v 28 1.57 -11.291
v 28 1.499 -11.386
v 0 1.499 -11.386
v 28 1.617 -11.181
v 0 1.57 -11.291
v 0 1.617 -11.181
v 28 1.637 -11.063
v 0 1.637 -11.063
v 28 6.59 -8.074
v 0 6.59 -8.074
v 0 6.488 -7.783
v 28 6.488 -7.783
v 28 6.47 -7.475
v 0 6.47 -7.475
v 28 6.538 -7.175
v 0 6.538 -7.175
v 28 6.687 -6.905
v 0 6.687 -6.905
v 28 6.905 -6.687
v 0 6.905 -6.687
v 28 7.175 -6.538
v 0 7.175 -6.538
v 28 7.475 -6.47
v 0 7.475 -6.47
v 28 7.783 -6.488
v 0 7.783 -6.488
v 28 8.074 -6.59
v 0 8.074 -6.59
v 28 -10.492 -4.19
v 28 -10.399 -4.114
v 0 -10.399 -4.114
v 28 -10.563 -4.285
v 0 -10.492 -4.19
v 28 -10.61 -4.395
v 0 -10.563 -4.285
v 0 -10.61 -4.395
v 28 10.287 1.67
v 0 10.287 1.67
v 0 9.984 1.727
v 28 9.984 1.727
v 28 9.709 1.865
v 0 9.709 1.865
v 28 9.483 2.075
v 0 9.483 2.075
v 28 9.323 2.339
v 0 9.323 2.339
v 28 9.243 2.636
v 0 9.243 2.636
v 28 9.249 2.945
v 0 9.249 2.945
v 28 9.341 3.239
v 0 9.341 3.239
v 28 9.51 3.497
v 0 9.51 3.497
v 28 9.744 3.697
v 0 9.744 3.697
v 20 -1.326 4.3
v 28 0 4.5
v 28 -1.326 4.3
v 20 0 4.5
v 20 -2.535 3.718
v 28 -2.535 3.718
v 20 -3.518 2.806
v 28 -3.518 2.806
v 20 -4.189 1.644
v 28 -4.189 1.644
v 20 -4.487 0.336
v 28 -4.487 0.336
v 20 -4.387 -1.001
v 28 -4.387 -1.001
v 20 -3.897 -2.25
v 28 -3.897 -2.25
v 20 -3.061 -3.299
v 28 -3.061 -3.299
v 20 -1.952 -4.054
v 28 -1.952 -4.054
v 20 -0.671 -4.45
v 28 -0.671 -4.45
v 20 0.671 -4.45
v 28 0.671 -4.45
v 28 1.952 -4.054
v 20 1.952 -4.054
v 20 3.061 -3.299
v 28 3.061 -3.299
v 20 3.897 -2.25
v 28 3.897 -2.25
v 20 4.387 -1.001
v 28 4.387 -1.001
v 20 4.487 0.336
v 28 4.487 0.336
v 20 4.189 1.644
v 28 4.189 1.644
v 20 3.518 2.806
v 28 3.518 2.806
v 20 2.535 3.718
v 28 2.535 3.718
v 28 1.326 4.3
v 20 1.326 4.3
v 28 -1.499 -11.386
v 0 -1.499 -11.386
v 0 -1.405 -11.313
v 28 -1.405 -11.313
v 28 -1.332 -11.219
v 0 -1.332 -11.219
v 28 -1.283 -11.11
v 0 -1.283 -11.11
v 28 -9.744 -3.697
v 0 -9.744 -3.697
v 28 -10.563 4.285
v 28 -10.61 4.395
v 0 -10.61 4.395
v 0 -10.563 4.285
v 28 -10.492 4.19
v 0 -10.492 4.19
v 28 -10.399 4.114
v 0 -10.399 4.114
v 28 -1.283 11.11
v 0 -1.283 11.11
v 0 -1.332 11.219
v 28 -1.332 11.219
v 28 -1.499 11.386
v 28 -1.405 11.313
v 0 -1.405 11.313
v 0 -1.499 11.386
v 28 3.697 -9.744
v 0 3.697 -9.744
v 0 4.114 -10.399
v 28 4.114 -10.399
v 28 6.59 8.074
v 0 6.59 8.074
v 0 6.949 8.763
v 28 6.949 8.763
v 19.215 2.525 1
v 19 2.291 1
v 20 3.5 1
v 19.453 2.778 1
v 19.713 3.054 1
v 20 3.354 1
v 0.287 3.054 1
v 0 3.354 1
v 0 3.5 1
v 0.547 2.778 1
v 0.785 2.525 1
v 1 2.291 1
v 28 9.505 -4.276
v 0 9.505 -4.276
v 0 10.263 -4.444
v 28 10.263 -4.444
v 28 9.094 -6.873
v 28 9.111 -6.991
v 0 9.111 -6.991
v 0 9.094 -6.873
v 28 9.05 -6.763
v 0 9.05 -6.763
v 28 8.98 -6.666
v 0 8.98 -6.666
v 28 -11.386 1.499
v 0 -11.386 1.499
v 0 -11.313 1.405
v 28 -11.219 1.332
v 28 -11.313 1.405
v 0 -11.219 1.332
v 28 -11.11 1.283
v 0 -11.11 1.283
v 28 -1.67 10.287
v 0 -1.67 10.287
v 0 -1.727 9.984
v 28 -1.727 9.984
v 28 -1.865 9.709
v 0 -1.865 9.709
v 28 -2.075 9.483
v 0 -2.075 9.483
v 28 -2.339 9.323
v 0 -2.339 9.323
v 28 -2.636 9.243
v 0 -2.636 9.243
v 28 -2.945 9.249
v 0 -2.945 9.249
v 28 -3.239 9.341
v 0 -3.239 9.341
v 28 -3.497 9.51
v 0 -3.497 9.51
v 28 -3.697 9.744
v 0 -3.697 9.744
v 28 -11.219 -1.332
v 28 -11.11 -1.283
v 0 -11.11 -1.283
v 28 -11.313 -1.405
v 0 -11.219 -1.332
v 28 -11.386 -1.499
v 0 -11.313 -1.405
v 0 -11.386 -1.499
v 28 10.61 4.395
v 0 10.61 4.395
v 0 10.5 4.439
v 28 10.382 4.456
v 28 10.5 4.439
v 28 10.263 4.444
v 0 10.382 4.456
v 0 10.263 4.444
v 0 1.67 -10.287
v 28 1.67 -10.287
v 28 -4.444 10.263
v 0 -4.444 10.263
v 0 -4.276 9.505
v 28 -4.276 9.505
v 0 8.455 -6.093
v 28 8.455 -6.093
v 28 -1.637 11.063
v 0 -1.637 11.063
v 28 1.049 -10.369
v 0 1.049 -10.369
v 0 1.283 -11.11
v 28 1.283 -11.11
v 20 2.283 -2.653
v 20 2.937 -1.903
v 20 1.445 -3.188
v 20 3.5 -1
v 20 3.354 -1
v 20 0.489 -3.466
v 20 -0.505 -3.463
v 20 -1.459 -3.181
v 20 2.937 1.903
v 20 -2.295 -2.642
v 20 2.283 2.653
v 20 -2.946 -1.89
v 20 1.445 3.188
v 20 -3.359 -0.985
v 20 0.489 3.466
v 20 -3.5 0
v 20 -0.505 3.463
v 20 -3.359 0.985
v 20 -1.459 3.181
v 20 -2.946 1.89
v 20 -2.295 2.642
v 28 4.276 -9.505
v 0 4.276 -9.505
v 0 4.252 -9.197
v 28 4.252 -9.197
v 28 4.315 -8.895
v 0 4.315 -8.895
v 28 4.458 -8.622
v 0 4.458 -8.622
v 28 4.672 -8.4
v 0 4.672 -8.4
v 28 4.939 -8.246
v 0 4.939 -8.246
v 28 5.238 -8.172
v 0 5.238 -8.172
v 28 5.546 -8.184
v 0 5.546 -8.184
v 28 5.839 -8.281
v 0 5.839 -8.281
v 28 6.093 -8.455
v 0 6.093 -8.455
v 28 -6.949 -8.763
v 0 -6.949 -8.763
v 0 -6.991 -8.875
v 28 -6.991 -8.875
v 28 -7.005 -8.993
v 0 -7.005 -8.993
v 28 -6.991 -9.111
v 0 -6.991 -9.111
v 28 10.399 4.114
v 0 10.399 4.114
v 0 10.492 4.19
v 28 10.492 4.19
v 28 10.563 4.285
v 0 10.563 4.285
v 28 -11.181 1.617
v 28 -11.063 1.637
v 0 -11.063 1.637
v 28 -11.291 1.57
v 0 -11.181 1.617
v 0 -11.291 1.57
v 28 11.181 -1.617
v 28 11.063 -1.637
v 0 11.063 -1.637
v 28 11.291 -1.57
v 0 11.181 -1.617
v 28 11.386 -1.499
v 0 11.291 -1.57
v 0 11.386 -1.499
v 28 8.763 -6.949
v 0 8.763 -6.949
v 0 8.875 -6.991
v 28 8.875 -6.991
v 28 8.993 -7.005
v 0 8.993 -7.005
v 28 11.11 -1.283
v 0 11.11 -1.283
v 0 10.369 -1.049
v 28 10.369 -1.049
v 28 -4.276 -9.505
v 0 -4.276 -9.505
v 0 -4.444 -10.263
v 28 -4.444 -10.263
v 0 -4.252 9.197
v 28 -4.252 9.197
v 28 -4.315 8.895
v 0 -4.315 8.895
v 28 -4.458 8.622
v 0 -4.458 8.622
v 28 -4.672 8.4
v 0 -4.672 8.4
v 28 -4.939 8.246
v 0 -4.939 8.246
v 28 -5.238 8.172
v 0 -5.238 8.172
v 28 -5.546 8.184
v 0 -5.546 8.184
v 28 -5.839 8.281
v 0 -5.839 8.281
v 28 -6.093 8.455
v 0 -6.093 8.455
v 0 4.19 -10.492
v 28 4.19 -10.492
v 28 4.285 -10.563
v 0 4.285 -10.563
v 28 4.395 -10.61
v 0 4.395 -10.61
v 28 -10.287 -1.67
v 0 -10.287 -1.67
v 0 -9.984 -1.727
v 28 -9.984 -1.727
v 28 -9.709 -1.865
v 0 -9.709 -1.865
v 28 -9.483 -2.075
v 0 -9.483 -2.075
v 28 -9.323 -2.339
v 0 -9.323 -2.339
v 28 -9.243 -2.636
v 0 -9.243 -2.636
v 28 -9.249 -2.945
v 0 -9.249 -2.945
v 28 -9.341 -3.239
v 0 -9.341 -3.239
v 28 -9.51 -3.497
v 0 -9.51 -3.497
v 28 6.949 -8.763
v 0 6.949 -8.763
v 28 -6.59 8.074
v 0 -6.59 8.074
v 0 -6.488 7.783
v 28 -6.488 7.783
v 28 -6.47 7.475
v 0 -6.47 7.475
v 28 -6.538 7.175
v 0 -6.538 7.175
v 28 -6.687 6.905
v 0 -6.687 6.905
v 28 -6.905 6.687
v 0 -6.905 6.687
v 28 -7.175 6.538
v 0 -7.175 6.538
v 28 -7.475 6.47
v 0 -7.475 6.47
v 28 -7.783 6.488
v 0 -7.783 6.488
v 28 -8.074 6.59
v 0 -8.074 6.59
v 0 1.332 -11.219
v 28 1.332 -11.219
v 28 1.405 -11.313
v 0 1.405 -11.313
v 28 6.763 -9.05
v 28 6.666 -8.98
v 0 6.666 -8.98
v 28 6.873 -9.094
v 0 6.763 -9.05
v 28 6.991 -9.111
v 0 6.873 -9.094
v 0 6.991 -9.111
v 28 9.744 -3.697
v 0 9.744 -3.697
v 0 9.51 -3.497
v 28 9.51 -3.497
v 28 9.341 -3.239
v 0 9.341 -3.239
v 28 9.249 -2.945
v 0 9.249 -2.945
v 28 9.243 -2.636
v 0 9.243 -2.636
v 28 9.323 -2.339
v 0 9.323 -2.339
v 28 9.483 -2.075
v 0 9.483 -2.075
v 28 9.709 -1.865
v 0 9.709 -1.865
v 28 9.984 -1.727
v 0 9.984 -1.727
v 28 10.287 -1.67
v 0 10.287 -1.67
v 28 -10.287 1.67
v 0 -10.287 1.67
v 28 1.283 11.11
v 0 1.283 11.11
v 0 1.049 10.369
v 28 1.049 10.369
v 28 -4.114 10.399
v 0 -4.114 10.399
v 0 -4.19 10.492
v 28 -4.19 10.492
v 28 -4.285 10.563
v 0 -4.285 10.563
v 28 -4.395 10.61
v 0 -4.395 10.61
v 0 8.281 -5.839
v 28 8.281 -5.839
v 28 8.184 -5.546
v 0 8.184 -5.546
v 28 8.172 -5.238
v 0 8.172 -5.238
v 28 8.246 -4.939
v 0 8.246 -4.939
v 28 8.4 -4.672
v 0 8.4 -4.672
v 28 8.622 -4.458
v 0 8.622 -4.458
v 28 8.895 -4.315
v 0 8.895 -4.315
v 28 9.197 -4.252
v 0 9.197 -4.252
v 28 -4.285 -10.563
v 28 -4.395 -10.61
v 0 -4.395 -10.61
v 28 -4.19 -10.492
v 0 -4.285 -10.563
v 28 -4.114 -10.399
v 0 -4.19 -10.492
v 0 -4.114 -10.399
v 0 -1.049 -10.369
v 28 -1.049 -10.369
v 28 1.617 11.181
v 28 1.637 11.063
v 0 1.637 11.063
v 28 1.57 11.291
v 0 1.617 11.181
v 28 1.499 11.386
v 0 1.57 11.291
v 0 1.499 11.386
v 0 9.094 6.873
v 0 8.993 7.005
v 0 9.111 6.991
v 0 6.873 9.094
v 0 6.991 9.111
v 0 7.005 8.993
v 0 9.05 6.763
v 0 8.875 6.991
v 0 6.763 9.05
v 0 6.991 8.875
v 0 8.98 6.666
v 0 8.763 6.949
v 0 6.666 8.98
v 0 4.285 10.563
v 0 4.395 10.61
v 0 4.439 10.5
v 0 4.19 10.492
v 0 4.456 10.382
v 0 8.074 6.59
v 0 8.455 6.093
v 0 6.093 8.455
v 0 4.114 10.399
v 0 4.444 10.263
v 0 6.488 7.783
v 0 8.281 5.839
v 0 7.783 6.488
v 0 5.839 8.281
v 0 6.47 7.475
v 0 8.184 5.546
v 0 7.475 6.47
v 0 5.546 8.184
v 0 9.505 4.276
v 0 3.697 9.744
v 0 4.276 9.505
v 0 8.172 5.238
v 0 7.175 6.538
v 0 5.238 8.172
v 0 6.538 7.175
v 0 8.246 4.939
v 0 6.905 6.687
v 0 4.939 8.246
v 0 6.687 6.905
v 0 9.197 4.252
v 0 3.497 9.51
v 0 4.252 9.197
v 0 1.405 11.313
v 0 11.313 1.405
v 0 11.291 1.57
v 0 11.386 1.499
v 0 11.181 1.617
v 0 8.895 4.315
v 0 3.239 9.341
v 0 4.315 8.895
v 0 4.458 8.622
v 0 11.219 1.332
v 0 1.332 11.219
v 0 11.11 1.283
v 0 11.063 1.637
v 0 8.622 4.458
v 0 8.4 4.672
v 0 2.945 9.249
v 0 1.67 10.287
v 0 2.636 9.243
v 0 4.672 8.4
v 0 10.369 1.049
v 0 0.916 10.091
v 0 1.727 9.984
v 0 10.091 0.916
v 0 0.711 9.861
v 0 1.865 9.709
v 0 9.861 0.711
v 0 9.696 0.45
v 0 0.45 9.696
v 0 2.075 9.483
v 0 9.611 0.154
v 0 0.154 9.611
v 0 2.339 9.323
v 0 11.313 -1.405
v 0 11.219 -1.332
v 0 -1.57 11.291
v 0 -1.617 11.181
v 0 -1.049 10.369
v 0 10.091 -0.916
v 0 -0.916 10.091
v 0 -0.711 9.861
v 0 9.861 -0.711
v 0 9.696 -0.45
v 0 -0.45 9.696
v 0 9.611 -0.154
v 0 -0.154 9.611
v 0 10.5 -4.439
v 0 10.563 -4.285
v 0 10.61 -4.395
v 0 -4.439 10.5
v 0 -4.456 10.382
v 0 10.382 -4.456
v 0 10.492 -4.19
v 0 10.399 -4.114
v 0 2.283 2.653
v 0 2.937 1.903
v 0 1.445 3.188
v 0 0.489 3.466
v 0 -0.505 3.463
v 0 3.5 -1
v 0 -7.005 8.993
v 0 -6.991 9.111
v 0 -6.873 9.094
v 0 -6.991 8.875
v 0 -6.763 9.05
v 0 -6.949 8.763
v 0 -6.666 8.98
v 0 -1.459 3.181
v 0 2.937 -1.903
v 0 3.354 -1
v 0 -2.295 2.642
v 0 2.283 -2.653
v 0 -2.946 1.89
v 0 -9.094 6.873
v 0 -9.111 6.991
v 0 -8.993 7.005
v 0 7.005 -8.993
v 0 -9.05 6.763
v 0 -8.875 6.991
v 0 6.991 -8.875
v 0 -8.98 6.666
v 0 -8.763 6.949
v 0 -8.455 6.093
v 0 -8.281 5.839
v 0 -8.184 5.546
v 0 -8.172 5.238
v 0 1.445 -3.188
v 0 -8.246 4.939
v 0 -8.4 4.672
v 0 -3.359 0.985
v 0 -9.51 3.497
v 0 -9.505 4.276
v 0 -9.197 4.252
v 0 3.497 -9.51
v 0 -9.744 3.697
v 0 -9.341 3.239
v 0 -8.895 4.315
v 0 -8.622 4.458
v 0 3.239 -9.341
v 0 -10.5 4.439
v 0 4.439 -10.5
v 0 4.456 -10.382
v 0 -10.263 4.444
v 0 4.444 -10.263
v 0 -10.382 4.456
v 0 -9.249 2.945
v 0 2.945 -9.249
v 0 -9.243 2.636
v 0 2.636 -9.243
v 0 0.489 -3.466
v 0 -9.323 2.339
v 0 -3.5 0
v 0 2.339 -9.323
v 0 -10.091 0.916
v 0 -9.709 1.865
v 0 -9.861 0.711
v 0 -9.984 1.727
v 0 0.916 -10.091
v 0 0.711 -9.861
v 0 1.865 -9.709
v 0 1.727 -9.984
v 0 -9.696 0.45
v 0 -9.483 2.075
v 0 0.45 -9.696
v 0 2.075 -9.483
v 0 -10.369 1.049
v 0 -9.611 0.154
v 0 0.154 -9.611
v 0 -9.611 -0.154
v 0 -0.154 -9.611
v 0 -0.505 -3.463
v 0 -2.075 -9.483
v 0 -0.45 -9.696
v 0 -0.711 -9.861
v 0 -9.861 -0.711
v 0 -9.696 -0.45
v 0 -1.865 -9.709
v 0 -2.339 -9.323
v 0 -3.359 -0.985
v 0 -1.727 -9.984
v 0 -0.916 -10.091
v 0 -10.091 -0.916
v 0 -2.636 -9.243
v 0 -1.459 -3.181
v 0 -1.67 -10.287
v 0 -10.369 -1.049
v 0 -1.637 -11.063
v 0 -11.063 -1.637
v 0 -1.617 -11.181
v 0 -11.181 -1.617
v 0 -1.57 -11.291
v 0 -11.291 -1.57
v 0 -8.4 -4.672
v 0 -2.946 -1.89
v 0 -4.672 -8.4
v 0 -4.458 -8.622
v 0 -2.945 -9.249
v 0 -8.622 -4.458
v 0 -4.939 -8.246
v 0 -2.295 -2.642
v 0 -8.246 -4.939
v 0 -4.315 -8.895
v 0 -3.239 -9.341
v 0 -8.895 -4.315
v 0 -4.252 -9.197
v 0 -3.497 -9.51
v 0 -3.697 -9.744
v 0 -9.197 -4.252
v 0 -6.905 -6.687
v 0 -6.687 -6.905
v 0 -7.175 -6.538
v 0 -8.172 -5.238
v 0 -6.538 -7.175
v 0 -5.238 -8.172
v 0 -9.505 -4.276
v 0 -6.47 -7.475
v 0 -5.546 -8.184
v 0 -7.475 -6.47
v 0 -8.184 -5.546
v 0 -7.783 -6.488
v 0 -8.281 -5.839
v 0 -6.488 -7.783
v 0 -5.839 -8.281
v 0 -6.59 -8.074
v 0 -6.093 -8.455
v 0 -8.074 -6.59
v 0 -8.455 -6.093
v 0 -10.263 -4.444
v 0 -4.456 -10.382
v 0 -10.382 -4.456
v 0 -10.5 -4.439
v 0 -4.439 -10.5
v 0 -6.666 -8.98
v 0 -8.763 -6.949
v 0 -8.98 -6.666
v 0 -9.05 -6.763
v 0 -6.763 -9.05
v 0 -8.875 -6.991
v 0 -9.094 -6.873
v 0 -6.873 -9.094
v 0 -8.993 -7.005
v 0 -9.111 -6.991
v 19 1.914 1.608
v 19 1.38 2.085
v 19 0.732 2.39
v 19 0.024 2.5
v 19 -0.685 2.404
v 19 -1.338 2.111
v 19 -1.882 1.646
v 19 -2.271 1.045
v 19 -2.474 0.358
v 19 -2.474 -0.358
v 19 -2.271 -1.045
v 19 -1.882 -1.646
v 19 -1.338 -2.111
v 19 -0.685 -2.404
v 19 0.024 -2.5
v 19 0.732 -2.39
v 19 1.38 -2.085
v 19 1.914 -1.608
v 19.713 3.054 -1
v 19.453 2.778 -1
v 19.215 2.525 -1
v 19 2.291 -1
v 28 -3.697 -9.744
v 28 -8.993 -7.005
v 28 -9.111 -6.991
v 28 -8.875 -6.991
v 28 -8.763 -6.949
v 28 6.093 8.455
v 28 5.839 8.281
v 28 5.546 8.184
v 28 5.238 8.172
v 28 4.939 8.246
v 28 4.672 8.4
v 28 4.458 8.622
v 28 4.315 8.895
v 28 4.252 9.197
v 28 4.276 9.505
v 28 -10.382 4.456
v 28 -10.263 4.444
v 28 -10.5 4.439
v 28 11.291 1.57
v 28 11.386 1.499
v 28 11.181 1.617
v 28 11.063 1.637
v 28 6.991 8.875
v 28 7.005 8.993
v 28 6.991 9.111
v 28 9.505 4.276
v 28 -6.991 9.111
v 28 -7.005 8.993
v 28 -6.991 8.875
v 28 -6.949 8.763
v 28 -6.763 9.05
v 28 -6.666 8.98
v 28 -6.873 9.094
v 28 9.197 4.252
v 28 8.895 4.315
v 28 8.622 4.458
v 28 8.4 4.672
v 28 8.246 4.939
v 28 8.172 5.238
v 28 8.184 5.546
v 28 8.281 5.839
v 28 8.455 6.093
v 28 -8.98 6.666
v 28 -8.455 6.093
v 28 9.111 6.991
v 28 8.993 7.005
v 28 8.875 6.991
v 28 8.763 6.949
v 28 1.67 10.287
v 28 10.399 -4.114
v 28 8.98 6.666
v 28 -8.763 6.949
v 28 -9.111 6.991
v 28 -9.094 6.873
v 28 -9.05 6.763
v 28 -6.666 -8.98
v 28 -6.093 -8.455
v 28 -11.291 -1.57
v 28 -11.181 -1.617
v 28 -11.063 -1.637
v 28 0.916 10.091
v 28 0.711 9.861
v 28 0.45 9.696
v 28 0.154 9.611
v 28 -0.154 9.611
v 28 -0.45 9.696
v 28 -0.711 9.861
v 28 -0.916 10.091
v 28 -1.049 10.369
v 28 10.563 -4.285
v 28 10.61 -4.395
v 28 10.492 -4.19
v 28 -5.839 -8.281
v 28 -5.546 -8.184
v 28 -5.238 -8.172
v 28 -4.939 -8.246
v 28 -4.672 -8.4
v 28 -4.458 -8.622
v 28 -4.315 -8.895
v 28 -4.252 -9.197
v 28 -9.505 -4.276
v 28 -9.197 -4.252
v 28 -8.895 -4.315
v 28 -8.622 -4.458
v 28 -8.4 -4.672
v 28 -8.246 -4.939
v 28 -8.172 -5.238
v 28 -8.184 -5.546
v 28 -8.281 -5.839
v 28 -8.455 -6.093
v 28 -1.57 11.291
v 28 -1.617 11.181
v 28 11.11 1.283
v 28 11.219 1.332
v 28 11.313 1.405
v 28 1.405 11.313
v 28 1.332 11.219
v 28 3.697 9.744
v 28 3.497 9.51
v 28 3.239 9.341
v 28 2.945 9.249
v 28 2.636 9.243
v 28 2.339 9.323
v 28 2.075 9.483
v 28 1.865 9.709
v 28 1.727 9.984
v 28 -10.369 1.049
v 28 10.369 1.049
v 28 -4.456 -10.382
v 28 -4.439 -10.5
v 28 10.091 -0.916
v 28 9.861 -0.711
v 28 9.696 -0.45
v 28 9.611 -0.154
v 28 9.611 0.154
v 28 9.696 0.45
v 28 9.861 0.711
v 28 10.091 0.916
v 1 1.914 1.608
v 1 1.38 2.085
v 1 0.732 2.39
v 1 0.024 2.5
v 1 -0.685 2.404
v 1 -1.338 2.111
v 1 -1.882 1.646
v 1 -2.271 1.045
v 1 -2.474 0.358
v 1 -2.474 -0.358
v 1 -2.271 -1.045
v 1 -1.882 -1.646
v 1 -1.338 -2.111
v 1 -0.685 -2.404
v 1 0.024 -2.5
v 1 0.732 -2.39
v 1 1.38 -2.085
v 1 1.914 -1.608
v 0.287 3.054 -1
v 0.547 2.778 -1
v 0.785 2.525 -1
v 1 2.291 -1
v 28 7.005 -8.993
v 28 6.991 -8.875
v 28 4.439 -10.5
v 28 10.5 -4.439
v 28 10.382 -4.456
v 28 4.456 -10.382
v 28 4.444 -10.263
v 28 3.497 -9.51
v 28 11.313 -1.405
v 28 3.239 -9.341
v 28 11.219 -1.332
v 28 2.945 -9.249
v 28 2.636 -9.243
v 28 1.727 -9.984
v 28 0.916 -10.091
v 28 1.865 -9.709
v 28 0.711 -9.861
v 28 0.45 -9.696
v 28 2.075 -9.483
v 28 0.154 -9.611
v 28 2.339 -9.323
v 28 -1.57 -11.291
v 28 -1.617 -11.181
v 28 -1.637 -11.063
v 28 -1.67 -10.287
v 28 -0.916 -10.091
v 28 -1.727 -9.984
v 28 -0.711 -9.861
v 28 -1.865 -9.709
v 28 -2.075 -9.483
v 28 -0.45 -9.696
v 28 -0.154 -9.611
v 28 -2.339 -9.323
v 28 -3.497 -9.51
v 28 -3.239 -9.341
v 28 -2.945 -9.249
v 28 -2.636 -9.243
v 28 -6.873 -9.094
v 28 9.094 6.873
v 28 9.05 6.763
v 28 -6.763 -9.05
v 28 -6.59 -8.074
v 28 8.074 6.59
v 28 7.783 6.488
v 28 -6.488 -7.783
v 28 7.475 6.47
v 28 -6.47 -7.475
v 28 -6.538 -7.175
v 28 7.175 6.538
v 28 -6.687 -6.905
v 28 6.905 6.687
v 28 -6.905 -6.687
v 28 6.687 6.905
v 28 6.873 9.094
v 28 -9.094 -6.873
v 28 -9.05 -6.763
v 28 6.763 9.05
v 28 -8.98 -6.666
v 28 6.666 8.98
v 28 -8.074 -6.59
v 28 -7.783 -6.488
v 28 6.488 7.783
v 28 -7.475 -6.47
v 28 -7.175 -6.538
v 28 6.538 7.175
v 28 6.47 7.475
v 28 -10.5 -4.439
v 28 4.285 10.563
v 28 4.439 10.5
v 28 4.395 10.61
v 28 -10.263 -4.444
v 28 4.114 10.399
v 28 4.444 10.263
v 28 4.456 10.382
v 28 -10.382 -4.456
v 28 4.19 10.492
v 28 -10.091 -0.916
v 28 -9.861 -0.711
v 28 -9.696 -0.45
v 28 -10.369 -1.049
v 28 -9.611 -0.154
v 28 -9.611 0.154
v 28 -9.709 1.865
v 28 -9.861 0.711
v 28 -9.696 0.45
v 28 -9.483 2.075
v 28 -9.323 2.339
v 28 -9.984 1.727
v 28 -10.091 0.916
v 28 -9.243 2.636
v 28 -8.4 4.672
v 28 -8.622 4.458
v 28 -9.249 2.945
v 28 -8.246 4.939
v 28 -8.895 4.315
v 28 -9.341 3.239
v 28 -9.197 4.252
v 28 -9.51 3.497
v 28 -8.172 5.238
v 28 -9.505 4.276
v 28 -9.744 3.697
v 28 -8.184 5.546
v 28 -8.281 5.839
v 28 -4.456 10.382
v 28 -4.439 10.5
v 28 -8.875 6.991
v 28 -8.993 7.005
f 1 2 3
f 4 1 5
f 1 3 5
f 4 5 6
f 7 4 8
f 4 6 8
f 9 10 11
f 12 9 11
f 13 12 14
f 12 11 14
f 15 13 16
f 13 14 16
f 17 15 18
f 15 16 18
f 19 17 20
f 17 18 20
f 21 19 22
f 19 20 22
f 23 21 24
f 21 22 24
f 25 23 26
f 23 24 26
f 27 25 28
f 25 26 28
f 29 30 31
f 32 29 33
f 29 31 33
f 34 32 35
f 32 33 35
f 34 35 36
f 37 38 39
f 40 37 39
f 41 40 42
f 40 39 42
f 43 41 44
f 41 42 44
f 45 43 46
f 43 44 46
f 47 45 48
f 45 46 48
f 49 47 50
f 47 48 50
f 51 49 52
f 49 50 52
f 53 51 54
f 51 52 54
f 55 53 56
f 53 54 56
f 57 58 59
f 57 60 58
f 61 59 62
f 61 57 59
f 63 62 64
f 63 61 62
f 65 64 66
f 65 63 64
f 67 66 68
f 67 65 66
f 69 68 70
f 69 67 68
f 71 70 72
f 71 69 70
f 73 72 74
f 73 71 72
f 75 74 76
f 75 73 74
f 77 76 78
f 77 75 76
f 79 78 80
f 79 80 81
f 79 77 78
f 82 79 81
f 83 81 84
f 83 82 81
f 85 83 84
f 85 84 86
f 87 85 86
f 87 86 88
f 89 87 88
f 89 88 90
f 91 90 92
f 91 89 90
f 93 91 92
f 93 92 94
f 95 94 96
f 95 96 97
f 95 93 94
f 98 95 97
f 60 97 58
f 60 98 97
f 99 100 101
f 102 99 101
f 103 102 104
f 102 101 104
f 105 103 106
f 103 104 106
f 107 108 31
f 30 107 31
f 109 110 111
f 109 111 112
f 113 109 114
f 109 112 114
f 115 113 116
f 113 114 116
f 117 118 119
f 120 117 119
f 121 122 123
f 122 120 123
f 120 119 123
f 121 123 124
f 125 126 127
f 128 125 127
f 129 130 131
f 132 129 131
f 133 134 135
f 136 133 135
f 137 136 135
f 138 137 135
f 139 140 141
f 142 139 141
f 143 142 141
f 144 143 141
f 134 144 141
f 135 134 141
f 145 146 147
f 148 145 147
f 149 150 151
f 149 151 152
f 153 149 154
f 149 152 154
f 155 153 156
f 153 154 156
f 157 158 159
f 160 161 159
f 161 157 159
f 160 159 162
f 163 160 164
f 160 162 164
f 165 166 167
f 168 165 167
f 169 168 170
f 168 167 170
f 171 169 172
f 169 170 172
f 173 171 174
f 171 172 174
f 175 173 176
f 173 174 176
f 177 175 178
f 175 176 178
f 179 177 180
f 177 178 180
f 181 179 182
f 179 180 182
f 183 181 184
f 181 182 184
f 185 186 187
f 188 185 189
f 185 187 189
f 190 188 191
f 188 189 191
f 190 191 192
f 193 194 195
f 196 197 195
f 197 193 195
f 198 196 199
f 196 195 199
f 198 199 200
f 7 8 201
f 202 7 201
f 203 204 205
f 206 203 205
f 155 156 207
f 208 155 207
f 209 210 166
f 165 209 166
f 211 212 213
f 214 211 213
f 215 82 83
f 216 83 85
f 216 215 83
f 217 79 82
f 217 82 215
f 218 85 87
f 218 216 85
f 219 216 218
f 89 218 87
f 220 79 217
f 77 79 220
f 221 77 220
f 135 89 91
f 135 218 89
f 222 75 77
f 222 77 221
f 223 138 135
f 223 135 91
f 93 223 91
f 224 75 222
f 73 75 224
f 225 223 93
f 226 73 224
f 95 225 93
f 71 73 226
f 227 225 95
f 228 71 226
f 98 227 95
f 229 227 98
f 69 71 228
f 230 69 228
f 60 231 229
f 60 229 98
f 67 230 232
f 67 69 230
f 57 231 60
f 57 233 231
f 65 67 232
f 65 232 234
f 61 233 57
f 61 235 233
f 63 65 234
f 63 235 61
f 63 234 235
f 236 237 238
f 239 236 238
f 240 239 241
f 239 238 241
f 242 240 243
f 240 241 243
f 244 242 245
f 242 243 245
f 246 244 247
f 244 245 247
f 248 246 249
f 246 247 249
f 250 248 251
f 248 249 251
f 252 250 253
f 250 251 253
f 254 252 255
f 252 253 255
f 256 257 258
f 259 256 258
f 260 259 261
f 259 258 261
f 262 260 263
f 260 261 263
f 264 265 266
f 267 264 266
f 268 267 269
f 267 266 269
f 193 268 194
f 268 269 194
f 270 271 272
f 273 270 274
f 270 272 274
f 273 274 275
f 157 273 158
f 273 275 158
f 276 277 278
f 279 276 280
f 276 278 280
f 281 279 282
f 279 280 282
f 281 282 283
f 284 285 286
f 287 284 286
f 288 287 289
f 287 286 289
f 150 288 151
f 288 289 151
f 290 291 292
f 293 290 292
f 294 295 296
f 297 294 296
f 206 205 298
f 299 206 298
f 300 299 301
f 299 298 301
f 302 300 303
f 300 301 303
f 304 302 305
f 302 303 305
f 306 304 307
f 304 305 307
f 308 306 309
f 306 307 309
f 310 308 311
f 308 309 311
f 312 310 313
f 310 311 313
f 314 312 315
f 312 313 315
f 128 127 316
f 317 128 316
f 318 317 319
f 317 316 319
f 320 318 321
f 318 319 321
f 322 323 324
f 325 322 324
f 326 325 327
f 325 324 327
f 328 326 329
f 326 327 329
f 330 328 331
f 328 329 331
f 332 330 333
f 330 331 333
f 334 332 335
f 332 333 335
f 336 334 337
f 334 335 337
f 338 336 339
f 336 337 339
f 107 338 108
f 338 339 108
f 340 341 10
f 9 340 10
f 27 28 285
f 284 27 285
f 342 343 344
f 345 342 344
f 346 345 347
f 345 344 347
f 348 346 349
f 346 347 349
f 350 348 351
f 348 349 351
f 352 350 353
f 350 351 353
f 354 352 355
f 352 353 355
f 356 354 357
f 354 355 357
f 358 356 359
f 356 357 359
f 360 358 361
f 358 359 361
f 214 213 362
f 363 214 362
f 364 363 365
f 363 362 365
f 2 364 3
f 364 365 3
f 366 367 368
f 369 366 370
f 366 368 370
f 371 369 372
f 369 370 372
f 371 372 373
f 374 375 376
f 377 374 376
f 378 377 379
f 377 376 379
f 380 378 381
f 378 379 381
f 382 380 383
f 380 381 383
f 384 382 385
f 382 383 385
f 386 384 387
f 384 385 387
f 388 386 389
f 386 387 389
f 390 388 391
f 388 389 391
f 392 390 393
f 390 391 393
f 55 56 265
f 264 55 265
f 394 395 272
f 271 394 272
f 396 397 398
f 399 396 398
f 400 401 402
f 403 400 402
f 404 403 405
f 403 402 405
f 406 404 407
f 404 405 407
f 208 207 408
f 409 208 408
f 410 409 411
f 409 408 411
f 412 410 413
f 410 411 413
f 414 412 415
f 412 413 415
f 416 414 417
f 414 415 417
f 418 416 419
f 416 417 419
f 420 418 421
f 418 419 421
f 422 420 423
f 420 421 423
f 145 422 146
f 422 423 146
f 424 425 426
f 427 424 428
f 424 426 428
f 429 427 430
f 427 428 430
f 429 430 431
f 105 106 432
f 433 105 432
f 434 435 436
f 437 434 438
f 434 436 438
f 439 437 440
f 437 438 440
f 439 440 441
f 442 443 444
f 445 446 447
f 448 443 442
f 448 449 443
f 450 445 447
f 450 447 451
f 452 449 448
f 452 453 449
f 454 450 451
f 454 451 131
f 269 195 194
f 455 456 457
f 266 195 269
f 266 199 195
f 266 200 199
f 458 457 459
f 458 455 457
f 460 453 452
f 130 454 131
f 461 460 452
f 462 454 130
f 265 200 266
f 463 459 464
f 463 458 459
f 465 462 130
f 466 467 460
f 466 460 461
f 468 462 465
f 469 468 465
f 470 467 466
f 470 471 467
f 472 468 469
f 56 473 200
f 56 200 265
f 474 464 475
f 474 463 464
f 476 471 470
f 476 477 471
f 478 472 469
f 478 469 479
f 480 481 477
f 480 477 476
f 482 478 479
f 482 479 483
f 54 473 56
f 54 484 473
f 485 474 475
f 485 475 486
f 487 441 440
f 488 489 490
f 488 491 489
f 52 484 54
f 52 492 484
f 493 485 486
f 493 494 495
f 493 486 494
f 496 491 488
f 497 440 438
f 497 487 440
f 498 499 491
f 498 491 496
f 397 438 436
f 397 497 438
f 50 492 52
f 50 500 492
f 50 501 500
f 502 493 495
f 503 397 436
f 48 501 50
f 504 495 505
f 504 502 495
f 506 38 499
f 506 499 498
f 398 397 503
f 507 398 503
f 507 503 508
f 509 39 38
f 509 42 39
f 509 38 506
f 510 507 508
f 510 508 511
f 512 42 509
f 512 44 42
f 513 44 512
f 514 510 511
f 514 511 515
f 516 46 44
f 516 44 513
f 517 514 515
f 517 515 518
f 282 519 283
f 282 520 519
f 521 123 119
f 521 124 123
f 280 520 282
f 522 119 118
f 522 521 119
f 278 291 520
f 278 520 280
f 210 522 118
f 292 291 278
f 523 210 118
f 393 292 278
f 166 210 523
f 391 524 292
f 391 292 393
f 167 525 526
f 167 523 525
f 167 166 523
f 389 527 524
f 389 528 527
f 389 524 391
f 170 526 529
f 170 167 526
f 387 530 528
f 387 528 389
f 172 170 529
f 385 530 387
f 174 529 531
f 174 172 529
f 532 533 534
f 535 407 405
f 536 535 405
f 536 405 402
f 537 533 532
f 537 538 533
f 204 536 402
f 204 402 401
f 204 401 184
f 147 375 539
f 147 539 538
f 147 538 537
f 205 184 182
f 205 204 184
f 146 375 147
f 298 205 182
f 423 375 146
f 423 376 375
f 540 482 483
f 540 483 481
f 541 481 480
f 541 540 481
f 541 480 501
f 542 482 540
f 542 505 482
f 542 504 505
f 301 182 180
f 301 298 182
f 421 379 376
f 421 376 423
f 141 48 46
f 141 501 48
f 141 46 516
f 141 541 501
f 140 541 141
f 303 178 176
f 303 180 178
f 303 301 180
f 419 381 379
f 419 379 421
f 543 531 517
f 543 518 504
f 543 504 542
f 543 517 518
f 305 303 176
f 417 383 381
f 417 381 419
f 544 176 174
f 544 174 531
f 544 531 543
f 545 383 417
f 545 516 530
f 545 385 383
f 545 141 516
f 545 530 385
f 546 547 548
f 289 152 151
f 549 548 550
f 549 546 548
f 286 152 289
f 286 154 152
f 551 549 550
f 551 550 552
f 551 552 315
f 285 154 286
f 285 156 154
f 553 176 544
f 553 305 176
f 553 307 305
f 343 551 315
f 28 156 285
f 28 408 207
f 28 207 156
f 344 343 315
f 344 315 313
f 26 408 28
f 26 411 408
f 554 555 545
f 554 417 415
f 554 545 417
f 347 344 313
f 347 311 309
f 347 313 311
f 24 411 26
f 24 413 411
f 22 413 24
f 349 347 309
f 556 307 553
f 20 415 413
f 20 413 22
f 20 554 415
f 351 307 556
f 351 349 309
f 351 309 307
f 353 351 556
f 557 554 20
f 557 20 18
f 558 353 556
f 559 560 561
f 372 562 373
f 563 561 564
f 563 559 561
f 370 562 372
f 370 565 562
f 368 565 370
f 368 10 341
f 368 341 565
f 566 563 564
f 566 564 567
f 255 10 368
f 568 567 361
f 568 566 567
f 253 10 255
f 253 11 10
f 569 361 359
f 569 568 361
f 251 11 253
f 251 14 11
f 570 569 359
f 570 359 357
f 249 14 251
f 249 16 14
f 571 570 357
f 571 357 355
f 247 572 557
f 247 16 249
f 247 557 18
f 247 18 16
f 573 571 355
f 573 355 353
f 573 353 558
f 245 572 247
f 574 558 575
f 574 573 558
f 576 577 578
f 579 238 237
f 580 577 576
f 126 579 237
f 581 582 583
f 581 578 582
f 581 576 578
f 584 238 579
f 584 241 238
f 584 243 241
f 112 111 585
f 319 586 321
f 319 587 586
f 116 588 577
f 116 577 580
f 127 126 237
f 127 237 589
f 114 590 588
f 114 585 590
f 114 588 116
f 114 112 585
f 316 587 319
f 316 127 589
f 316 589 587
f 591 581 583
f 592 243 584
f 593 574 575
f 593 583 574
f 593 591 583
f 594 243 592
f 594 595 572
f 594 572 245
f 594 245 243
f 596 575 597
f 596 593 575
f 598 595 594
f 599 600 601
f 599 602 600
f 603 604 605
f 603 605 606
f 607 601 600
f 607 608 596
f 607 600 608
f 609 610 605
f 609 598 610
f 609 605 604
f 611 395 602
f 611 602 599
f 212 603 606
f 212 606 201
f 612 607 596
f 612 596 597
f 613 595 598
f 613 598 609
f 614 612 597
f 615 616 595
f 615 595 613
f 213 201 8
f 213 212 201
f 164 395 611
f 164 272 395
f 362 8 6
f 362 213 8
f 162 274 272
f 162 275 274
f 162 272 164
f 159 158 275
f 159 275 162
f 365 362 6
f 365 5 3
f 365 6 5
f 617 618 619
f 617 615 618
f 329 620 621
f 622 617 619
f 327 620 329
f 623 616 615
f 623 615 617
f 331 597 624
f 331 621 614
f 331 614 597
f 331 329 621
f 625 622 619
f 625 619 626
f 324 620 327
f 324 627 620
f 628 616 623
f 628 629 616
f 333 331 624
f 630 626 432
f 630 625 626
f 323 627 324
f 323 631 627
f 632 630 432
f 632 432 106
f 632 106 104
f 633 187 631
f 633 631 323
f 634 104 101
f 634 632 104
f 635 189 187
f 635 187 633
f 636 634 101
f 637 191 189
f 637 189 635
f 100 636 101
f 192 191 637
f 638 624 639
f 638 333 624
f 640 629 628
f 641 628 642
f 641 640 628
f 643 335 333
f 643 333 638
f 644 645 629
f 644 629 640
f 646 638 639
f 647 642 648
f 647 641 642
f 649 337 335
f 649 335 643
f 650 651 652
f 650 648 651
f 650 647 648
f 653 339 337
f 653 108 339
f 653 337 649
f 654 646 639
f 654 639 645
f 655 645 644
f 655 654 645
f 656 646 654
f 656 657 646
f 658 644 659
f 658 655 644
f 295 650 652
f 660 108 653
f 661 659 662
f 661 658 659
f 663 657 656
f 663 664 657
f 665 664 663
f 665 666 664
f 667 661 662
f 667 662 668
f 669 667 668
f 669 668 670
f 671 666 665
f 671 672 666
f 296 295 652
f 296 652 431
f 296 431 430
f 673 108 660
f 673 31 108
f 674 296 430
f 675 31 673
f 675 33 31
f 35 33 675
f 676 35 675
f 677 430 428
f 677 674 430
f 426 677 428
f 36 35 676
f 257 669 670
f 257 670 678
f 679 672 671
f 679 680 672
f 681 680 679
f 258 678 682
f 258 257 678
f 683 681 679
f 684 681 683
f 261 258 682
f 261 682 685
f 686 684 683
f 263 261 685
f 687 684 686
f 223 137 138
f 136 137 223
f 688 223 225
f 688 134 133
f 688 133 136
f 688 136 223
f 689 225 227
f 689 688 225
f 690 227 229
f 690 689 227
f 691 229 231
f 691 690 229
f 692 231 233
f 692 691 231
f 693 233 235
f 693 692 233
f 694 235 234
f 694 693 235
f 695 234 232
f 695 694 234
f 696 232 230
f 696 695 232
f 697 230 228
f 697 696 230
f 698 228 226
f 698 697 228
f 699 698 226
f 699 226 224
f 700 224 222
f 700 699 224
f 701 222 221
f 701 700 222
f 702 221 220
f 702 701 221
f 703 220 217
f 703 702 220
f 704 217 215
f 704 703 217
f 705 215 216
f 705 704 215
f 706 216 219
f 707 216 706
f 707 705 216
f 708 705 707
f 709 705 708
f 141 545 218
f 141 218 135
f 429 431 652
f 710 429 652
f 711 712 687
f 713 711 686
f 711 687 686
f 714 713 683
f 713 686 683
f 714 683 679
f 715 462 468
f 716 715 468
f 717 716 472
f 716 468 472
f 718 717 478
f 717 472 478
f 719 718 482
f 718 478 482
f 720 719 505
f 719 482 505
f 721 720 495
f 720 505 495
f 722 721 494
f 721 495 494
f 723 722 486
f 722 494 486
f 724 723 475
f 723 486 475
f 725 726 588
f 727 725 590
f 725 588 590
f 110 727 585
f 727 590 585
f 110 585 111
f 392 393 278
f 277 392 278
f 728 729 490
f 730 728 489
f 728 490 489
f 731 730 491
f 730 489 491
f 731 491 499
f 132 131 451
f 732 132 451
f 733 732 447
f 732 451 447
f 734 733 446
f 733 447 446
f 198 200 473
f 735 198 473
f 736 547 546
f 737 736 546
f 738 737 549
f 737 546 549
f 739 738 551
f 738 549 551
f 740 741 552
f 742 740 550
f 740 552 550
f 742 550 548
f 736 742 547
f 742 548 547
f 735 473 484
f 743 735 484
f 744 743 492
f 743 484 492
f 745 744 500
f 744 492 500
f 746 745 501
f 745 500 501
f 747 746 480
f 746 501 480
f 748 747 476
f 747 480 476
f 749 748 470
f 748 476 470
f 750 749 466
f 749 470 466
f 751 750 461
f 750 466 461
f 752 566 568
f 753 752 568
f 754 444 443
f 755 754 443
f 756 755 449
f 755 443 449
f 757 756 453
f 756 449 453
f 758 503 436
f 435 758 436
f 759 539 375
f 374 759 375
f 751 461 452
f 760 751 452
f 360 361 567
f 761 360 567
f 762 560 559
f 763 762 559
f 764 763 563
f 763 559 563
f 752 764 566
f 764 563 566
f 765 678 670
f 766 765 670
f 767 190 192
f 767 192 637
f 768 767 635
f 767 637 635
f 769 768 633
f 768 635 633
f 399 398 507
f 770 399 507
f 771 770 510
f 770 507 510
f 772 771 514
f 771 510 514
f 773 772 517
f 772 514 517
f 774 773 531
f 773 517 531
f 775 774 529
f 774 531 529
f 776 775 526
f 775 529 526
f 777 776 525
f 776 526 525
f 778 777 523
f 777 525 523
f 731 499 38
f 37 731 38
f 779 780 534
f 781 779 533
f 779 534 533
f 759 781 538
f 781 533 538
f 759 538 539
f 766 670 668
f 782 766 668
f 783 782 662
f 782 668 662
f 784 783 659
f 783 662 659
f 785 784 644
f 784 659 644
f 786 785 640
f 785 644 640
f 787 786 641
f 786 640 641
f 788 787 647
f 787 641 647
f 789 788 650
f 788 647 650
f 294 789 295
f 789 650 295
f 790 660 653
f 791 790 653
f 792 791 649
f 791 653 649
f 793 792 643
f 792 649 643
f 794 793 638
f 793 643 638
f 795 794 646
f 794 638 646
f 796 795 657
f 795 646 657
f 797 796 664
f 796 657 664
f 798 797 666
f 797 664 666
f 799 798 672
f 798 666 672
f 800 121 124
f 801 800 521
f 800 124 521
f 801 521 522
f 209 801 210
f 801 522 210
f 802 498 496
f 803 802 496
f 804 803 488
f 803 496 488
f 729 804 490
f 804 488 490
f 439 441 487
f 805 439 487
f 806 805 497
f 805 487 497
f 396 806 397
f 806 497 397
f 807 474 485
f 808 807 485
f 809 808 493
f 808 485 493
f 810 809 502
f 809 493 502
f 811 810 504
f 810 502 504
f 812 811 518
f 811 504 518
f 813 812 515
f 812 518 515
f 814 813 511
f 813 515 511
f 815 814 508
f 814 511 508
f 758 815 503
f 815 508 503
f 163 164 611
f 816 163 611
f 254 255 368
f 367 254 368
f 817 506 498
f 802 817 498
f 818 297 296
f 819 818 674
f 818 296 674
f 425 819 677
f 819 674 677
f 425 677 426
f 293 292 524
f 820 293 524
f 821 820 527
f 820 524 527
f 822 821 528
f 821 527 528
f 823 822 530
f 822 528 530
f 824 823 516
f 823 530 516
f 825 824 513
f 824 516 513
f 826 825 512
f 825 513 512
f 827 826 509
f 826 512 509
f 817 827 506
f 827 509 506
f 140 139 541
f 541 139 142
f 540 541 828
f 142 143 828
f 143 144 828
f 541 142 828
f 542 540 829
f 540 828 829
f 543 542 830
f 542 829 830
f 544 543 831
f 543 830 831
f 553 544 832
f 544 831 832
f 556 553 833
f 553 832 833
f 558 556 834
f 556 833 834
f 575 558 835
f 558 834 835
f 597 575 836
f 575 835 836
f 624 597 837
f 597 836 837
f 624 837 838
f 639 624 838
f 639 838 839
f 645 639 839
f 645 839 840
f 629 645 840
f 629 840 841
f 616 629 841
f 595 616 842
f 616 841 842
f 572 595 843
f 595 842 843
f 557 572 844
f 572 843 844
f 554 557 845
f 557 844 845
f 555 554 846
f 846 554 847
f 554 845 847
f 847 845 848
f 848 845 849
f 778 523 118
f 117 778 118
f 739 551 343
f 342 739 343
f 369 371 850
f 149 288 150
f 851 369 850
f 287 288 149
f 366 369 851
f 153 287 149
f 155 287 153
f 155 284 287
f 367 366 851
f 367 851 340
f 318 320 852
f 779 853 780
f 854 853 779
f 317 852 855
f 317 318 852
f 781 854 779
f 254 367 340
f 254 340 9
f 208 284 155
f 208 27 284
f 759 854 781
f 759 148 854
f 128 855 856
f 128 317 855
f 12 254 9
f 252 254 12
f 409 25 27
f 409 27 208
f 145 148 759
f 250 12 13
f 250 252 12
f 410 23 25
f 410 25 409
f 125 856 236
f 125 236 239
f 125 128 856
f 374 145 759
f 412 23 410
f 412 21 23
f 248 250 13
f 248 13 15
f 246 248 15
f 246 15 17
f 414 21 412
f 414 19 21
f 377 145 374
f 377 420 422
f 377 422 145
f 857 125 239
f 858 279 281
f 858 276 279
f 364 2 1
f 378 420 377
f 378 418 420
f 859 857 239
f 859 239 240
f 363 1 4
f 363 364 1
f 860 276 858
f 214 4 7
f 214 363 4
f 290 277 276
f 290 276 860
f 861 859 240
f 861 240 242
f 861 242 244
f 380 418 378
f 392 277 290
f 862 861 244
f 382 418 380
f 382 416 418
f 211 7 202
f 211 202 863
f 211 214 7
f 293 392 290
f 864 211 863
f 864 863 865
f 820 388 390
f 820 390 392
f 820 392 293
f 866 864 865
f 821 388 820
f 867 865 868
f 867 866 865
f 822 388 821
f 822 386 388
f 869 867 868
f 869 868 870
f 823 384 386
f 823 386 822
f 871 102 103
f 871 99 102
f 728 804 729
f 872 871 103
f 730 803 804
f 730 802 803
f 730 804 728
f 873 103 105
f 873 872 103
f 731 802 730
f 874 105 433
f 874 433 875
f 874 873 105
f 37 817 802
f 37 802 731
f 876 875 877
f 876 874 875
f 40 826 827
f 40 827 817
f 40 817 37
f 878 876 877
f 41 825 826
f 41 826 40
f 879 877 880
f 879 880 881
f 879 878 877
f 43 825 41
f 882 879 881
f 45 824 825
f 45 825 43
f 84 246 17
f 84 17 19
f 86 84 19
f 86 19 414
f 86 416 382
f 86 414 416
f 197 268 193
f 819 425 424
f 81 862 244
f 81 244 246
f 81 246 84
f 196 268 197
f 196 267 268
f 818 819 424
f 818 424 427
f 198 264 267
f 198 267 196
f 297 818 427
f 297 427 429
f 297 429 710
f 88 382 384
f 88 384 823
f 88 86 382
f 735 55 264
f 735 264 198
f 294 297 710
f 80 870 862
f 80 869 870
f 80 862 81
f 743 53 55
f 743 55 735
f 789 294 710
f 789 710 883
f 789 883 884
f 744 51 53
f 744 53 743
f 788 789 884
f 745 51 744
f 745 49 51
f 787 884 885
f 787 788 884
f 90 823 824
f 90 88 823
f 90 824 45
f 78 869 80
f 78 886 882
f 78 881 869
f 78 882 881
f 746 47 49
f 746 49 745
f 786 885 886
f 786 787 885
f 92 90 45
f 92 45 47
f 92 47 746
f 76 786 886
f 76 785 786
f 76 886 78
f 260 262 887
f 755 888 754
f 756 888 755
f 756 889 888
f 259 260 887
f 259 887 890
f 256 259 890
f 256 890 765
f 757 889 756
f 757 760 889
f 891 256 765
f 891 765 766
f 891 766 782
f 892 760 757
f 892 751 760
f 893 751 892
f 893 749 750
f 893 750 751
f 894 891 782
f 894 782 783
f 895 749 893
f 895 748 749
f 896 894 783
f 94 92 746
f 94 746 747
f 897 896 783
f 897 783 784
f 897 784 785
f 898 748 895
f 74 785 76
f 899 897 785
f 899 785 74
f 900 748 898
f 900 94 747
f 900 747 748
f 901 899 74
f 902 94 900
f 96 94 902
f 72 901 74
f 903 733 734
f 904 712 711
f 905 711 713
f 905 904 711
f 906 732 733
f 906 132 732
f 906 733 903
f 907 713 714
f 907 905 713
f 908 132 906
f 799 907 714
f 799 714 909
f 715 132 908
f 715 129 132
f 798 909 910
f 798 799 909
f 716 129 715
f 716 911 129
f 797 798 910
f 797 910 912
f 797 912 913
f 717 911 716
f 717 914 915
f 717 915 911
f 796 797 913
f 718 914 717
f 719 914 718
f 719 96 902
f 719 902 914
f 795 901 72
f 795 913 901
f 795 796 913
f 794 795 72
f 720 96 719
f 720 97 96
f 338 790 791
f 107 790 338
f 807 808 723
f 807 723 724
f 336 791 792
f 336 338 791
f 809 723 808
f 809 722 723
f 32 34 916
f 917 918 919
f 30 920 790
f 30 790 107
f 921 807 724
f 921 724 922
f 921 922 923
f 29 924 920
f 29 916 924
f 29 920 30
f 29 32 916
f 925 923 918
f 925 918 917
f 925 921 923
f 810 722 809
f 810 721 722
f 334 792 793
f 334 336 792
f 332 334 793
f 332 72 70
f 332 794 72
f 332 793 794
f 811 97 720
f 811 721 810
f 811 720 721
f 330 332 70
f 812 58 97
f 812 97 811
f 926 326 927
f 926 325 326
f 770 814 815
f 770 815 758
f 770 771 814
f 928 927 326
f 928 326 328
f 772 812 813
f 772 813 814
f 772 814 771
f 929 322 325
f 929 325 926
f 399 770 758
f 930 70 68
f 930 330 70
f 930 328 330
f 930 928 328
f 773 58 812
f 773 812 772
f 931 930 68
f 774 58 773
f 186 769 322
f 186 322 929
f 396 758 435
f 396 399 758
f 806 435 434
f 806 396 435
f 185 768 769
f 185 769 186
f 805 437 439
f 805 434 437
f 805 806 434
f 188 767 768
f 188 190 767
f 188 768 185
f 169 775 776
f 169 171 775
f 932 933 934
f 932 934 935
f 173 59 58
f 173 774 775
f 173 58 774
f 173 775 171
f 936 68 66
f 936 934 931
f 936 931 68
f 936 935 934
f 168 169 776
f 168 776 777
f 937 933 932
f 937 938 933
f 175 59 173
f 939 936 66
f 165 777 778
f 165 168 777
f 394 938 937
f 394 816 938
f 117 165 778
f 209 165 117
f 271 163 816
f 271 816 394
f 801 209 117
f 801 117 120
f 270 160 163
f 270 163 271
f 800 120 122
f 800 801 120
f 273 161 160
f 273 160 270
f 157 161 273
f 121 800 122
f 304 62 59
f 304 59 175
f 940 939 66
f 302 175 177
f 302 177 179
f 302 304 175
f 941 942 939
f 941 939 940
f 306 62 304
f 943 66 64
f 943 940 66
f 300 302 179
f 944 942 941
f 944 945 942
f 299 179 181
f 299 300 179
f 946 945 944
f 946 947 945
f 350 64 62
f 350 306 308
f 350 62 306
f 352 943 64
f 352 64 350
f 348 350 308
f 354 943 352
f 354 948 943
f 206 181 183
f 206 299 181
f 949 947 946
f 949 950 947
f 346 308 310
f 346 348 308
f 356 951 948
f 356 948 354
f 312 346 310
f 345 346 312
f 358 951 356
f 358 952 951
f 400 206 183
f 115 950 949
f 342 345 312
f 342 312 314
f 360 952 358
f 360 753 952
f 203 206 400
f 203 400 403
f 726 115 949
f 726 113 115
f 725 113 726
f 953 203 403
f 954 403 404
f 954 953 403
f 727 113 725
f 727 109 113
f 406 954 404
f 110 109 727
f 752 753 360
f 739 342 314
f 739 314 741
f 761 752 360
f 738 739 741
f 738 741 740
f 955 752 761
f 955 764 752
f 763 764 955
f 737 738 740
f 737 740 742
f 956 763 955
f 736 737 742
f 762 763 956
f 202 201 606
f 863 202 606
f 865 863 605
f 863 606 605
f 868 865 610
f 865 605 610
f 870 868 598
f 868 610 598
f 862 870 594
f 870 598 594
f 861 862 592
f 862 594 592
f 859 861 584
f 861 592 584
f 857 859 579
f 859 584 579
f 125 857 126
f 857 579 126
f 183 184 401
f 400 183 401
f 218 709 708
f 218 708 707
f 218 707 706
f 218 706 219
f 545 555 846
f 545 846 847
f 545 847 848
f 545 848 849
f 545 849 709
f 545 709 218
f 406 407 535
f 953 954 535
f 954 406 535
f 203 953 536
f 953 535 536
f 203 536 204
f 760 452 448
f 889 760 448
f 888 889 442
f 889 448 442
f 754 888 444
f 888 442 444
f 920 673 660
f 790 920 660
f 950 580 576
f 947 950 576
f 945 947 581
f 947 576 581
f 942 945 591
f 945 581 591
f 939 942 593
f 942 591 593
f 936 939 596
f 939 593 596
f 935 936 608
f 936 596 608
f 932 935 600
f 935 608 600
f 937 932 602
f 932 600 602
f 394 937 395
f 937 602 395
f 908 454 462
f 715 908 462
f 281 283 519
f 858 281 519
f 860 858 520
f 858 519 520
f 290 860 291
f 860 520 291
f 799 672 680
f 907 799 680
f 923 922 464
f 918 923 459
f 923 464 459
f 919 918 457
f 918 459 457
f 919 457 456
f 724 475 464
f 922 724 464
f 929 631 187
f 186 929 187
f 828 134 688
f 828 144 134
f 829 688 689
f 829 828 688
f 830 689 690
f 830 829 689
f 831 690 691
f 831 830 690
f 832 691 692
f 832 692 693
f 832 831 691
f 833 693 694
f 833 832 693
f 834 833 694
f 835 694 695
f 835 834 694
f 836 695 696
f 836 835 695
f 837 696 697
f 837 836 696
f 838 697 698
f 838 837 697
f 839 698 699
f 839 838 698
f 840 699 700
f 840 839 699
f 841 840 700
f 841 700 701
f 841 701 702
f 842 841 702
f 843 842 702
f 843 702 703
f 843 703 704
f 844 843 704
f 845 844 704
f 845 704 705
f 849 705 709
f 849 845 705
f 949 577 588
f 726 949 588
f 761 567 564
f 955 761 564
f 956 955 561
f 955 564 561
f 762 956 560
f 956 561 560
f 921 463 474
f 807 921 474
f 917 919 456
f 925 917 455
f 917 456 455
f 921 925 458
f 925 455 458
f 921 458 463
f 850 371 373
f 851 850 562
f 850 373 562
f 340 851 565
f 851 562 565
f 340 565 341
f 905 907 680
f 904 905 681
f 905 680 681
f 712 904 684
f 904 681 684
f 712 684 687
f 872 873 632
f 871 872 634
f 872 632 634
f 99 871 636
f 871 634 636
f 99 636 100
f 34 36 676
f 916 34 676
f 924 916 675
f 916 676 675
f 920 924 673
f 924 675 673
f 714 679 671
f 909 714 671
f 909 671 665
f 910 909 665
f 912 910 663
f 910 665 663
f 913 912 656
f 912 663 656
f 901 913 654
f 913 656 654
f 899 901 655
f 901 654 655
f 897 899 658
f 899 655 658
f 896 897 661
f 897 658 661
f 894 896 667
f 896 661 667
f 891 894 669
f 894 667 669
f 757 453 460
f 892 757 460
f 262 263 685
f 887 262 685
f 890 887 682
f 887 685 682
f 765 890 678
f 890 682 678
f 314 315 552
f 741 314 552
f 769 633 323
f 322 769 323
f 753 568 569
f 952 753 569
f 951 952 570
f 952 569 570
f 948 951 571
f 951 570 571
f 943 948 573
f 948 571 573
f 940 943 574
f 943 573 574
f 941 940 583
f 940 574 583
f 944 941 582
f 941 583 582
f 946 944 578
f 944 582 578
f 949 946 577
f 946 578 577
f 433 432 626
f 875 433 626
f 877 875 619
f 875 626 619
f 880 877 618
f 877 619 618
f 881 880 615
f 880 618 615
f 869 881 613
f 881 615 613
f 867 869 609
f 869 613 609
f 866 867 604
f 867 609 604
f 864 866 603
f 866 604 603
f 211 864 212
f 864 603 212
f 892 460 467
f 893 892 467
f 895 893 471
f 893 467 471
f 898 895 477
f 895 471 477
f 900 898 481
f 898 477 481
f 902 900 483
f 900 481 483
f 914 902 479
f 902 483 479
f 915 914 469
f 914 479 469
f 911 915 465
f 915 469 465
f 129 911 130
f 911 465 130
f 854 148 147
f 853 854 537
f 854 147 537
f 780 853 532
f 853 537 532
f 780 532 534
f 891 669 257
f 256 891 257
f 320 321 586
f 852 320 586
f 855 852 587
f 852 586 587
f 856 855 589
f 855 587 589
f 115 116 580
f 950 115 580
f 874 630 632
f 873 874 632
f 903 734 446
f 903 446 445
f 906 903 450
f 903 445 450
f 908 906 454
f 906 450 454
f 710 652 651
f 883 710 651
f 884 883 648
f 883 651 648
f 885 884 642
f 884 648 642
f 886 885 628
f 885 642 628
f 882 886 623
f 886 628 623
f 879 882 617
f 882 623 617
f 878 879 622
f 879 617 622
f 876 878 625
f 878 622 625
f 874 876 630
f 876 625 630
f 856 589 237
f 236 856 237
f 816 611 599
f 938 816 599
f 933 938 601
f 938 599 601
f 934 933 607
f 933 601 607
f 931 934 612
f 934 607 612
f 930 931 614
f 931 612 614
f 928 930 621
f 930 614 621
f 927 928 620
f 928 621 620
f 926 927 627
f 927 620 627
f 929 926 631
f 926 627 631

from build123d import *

# Parameters (mm, degrees)
CHAMFER_1_SIZE           = 1
SKETCH_4_W               = 2
SKETCH_4_H               = 1.208712153
CUT_EXTRUDE_1_DEPTH      = 33.451810427
CUT_EXTRUDE_2_REACH      = 34.452
PATTERN_CIRCULAR_3_COUNT = 24


with BuildPart() as part:
    # 草图1 → 旋转1 (revolve)
    with BuildSketch(Plane.XY):
        Polygon((0, 2.5), (0, 11.6), (28, 11.6), (28, 4.5), (20, 4.5), (20, 2.5), align=None)
    revolve(axis=Axis((0, 0, 0), (1, 0, 0)))

    # 倒角1
    chamfer_1_edges = [part.edges().sort_by_distance(p)[0] for p in [
        (20, -2.5, 0),
        (0, -2.5, 0),
    ]]
    chamfer(chamfer_1_edges, length=CHAMFER_1_SIZE)

    # 草图4 → 切除-拉伸1 (cut, through all)
    with BuildSketch(Plane.ZY):
        with Locations((0, 2.895643923)):
            Rectangle(SKETCH_4_W, SKETCH_4_H)
    extrude(amount=-CUT_EXTRUDE_1_DEPTH, mode=Mode.SUBTRACT)

    # 草图6 → 切除-拉伸2 (cut, up to next)
    with BuildSketch(Plane(origin=(0, 0, 0), x_dir=(0, 0, -1), z_dir=(1, 0, 0)), mode=Mode.PRIVATE) as cut_extrude_2_sk1:
        with BuildLine():
            Line((1.282657956, 11.110010829), (1.049088646, 10.369223621))
            ThreePointArc((1.049088646, 10.369223621), (0, 9.6), (-1.049088646, 10.369223621))
            Line((-1.049088646, 10.369223621), (-1.282657956, 11.110010829))
            ThreePointArc((-1.282657956, 11.110010829), (-1.496857499, 11.385110965), (-1.838773928, 11.453336215))
            ThreePointArc((-1.838773928, 11.453336215), (-2.085185987, 11.411047253), (-2.330629413, 11.363457508))
            Line((-2.330629413, 11.363457508), (-2.815847343, 12.902372174))
            ThreePointArc((-2.815847343, 12.902372174), (0, 13.206066938), (2.815847343, 12.902372174))
            Line((2.815847343, 12.902372174), (2.330629413, 11.363457508))
            ThreePointArc((2.330629413, 11.363457508), (2.085185987, 11.411047253), (1.838773928, 11.453336215))
            ThreePointArc((1.838773928, 11.453336215), (1.496857499, 11.385110965), (1.282657956, 11.110010829))
        make_face()
    cut_extrude_2_tool1 = extrude(cut_extrude_2_sk1.sketch, amount=CUT_EXTRUDE_2_REACH, mode=Mode.PRIVATE) & part.part
    cut_extrude_2 = cut_extrude_2_tool1.solids().sort_by_distance((0, 11.799996, 0))[0]
    add(cut_extrude_2, mode=Mode.SUBTRACT)

    # 阵列(圆周)3: 切除-拉伸2 ×24 about axis
    pattern_circular_3_axis = Axis((-1.4, 0, 0), (1, 0, 0))
    for i in range(1, PATTERN_CIRCULAR_3_COUNT):
        add(cut_extrude_2.rotate(pattern_circular_3_axis, i * 360 / PATTERN_CIRCULAR_3_COUNT), mode=Mode.SUBTRACT)


solid = part.part
